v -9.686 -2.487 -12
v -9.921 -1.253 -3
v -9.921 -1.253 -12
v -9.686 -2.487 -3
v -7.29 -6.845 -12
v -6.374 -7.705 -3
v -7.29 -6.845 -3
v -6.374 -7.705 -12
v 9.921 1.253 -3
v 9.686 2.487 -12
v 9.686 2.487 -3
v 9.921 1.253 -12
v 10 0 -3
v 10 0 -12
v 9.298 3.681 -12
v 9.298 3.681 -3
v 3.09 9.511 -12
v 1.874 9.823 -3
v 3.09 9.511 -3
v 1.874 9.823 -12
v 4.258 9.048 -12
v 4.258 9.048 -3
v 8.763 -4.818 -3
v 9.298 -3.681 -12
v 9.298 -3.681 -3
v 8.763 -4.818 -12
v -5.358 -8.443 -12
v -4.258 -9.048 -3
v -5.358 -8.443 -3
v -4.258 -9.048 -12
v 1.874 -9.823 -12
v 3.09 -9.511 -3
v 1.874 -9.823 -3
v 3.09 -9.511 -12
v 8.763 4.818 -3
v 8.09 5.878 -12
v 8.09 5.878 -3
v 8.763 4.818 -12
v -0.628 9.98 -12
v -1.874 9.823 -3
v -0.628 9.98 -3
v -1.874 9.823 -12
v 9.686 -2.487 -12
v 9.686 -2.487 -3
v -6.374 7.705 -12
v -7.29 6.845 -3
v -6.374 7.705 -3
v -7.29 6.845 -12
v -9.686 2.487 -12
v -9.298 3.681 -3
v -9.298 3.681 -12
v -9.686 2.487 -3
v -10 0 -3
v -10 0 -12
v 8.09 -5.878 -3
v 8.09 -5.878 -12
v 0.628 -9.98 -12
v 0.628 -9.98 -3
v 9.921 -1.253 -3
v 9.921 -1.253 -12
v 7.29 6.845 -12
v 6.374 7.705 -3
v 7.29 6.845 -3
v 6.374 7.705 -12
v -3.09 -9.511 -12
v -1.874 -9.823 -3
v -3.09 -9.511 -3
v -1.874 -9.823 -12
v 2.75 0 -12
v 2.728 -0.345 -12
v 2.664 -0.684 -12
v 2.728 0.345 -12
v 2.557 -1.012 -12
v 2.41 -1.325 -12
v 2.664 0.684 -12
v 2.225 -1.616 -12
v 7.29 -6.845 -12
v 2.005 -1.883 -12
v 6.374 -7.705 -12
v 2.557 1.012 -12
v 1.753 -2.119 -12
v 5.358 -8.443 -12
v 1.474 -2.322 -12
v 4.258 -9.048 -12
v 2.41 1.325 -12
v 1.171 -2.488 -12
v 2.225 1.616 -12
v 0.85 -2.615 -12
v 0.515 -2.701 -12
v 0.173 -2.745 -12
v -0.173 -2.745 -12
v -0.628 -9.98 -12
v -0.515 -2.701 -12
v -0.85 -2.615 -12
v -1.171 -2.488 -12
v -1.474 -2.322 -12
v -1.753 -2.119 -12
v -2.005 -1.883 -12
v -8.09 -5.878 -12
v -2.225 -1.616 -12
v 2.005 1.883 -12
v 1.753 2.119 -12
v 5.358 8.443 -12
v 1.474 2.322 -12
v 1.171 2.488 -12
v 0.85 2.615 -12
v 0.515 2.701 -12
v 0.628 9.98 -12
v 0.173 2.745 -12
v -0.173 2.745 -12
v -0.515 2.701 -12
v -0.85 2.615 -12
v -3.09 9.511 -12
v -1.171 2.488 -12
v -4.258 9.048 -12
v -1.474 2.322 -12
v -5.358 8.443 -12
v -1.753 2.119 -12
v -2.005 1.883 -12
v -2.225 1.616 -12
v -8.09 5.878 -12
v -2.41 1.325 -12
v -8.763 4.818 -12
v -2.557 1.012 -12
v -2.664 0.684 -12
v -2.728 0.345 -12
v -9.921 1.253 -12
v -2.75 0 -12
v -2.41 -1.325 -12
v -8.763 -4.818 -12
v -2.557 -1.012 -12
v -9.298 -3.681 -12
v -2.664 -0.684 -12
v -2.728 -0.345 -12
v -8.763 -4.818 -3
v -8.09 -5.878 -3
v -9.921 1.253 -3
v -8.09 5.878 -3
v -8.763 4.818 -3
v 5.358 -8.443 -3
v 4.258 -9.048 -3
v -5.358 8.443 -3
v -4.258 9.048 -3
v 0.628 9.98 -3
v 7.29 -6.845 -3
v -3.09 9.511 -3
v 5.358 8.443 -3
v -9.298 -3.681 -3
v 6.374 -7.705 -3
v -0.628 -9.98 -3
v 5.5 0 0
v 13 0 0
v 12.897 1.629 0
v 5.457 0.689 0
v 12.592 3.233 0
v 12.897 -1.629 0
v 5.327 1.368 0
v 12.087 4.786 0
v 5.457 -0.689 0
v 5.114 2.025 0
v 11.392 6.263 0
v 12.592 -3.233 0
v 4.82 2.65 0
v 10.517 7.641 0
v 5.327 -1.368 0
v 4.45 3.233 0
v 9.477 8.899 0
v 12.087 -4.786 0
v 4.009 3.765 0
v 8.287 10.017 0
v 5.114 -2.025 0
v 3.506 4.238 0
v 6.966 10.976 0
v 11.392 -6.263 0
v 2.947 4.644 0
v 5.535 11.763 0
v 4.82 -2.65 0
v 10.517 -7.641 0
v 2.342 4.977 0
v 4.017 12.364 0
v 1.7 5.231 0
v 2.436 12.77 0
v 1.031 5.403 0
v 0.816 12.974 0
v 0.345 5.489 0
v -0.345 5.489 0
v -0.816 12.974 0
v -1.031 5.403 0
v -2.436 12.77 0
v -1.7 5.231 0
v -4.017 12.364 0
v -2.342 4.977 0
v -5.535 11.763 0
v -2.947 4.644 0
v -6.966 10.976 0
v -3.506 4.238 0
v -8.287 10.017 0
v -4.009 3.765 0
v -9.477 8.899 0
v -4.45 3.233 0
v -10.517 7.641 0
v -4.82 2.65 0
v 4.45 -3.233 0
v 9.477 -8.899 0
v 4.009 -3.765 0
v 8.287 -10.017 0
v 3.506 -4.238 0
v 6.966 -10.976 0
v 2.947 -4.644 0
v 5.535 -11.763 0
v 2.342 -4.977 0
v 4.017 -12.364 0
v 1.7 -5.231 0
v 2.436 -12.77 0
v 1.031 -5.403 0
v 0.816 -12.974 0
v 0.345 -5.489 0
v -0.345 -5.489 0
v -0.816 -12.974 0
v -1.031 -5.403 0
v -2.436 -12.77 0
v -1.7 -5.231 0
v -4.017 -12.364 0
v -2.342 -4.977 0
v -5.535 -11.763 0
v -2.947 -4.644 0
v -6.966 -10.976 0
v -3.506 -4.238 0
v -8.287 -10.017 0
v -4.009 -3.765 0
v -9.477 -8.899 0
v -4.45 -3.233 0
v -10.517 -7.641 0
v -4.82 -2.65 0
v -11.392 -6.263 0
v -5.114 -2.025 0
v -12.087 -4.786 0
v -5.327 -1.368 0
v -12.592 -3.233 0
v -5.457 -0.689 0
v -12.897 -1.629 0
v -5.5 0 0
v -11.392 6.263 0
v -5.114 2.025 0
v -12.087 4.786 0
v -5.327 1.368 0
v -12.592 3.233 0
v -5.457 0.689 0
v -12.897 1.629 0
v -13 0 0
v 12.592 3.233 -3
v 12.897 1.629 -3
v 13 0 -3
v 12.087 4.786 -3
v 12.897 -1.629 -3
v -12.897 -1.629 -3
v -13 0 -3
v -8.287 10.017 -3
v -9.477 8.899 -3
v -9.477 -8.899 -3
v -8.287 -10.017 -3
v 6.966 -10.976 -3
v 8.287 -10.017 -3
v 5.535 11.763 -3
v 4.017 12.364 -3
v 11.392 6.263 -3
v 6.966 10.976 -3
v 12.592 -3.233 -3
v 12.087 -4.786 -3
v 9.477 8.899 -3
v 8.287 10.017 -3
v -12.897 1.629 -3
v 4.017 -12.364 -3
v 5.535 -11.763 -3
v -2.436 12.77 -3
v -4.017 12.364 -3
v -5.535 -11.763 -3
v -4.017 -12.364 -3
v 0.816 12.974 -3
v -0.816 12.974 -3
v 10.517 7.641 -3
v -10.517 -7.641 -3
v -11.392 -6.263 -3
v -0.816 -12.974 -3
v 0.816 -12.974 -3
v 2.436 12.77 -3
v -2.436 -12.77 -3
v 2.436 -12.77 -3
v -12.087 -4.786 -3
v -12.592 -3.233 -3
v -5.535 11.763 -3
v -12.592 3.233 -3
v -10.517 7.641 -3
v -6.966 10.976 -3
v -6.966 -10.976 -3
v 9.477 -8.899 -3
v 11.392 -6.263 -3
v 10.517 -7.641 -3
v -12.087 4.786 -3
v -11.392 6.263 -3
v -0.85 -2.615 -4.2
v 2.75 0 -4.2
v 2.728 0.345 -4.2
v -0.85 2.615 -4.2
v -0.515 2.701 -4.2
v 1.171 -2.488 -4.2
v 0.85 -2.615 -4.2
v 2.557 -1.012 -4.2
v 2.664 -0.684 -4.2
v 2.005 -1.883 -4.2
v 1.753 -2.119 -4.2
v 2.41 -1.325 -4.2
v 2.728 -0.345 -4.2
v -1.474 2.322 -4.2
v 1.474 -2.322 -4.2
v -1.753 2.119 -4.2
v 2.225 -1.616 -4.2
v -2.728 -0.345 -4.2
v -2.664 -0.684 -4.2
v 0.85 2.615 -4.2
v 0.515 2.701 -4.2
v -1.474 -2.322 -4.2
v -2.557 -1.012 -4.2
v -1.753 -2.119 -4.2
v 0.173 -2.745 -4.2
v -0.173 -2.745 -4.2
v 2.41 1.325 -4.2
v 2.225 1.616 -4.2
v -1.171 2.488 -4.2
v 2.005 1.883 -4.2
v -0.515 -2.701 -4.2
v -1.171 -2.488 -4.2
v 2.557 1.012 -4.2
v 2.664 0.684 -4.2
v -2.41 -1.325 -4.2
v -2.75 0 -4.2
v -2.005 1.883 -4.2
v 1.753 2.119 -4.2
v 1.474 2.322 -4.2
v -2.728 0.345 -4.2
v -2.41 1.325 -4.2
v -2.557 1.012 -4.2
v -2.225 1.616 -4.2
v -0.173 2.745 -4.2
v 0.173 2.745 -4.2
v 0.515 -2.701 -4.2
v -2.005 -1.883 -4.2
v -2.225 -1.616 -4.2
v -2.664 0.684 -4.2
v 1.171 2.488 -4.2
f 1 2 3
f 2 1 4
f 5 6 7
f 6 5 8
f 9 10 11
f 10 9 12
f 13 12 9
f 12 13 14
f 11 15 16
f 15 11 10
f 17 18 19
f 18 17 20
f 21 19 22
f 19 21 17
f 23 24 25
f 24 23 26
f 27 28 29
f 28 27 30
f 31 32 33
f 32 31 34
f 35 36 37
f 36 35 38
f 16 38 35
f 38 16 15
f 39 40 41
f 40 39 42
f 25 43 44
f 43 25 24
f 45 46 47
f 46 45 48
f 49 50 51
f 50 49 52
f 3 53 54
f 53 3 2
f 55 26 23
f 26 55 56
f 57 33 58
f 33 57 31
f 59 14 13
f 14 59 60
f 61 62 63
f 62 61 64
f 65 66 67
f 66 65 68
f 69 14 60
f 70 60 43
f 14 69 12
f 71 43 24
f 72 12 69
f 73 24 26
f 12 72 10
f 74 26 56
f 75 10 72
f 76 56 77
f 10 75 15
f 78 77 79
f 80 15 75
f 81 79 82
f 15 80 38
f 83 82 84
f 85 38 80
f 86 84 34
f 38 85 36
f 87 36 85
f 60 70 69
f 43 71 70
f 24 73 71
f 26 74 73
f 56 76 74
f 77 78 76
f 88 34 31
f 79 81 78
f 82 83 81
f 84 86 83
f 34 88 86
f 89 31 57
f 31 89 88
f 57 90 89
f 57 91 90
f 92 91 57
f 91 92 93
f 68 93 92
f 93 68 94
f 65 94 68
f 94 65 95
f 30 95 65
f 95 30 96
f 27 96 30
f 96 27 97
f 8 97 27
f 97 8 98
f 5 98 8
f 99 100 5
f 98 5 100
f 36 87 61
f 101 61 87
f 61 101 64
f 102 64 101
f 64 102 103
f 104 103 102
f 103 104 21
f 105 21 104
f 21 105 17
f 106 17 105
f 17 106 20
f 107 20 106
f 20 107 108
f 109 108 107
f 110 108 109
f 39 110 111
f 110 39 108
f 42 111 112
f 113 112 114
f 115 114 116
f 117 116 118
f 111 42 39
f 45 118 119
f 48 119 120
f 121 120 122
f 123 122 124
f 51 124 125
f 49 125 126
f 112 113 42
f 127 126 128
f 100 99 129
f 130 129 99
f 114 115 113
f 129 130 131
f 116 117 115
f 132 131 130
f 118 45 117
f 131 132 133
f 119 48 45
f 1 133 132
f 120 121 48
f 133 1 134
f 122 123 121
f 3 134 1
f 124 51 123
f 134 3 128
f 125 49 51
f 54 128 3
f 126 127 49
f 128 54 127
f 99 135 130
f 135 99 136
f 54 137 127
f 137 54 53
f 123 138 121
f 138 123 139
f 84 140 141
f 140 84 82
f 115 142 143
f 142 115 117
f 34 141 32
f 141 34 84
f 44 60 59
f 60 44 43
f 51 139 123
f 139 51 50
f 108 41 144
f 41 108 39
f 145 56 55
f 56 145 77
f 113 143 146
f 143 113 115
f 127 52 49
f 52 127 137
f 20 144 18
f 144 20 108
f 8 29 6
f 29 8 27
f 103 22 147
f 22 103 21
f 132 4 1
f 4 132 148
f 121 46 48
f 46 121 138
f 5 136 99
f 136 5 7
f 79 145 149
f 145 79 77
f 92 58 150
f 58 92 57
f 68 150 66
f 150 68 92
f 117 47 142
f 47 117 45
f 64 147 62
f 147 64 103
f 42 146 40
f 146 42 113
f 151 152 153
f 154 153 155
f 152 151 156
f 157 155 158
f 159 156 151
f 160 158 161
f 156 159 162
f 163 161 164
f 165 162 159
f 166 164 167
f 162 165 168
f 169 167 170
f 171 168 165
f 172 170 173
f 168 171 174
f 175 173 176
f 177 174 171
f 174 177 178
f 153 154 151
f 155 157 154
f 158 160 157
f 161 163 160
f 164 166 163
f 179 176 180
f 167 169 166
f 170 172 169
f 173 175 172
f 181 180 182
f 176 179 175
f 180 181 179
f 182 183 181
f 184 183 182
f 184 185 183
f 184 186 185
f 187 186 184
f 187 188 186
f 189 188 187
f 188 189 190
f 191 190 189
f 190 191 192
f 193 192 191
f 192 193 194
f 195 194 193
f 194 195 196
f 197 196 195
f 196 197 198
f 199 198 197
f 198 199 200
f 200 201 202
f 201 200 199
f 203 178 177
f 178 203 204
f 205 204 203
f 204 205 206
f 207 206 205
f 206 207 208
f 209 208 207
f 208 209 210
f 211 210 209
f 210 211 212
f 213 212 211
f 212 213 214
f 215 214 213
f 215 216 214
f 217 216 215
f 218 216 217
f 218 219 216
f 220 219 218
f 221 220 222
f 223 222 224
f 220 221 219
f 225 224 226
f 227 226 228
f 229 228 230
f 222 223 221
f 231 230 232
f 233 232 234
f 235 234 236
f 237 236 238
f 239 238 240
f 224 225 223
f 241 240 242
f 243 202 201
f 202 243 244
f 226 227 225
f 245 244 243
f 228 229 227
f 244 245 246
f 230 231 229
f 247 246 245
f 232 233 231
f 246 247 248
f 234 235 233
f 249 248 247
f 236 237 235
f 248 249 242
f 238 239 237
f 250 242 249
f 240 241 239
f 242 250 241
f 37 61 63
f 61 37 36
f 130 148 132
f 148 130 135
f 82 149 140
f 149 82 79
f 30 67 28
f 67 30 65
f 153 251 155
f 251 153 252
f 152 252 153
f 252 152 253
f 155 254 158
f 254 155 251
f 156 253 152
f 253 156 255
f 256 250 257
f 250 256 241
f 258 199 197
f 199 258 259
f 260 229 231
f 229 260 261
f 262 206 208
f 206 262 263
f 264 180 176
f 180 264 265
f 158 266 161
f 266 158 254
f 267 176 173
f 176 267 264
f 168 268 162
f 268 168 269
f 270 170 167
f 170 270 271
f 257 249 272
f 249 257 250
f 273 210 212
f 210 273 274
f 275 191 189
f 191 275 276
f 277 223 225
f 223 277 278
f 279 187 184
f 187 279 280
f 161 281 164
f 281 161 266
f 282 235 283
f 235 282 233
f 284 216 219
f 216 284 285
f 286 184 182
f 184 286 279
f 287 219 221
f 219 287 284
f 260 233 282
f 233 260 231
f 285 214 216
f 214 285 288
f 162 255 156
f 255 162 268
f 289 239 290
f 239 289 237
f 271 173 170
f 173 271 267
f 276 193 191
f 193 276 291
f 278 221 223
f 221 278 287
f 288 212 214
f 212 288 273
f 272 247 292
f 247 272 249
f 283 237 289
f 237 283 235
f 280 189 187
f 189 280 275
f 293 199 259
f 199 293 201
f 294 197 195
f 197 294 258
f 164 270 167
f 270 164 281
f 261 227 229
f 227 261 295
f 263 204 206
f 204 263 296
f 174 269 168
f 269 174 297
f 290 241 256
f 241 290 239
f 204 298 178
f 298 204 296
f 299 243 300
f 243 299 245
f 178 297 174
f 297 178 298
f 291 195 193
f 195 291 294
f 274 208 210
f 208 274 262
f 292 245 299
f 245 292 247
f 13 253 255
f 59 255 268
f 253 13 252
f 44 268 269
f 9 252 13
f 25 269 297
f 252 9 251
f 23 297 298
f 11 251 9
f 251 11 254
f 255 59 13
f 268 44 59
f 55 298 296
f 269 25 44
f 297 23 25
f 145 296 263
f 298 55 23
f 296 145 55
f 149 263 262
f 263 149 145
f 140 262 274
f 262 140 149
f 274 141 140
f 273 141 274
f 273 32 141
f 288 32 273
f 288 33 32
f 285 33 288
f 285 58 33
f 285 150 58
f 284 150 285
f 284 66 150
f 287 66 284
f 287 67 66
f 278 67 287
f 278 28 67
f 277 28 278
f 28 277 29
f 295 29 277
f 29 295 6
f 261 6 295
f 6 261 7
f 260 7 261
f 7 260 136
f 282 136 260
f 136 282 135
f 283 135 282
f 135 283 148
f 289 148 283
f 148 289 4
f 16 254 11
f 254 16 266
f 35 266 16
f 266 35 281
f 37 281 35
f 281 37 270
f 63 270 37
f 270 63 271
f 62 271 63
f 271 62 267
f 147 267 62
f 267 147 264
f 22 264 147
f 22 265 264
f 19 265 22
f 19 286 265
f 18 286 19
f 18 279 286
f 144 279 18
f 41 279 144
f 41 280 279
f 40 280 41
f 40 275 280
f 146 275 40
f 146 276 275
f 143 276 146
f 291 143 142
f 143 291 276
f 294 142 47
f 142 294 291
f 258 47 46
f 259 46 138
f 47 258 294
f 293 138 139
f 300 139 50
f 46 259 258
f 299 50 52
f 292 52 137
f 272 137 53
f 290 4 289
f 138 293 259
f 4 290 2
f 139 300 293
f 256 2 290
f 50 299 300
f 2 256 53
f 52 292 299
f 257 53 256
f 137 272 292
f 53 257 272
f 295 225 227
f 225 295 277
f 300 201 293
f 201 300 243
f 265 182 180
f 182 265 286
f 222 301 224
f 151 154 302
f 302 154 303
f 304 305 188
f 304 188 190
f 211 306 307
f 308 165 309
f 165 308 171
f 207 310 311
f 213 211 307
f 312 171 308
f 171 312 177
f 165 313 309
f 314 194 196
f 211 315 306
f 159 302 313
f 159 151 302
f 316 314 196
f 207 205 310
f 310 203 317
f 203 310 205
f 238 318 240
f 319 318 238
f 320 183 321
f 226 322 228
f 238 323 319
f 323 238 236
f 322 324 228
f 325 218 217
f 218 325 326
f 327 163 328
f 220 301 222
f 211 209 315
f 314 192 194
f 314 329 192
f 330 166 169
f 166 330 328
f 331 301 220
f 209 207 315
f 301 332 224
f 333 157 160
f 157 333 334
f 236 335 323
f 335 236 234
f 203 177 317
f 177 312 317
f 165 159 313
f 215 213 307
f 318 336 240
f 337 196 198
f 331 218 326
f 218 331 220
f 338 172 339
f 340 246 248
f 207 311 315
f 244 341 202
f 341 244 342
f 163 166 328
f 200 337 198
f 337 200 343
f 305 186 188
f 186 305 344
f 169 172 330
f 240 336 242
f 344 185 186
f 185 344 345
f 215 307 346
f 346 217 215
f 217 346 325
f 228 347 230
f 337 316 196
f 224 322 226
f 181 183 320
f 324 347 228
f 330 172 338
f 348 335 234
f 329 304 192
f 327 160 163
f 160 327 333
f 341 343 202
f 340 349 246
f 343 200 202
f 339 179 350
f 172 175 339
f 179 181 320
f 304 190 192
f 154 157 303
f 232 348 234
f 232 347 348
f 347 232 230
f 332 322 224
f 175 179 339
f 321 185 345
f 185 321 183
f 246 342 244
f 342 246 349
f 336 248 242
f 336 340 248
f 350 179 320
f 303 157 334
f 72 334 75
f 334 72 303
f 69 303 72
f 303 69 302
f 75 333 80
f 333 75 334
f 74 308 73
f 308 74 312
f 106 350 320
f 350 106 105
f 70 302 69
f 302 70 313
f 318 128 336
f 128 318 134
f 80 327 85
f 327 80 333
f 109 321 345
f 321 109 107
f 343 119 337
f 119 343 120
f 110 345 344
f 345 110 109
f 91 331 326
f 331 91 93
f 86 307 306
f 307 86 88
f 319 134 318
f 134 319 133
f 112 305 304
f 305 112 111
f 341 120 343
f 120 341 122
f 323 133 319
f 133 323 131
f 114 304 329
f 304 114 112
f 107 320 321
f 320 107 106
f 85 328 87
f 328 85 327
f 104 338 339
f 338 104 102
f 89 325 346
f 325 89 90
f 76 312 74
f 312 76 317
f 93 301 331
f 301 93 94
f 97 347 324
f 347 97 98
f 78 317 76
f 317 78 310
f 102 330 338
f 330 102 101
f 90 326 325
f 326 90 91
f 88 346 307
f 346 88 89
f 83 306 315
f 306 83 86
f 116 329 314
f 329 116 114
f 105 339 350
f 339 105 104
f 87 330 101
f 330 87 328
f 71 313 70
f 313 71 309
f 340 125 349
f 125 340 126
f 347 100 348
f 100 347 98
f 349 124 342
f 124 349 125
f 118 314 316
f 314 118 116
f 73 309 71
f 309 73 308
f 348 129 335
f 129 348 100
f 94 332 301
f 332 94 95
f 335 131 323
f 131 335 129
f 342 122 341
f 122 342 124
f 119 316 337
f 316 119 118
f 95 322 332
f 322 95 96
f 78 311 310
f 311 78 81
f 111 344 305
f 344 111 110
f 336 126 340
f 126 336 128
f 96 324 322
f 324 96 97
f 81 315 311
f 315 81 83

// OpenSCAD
$fn = 50;


difference() {
	union() {
		translate(v = [0, 0, -12.0000000000]) {
			cylinder(h = 12, r = 10.0000000000);
		}
		translate(v = [0, 0, -3.0000000000]) {
			cylinder(h = 3, r = 13.0000000000);
		}
	}
	union() {
		translate(v = [0, 0, 0]) {
			rotate(a = [0, 0, 0]) {
				difference() {
					union() {
						#translate(v = [0, 0, -12.0000000000]) {
							cylinder(h = 12, r = 2.2500000000);
						}
						#translate(v = [0, 0, -4.2000000000]) {
							cylinder(h = 4.2000000000, r = 10.0000000000, r1 = 2.7500000000, r2 = 5.5000000000);
						}
						#translate(v = [0, 0, -12.0000000000]) {
							cylinder(h = 12, r = 2.7500000000);
						}
						#translate(v = [0, 0, -12.0000000000]) {
							cylinder(h = 12, r = 2.2500000000);
						}
					}
					union();
				}
			}
		}
	}
}
